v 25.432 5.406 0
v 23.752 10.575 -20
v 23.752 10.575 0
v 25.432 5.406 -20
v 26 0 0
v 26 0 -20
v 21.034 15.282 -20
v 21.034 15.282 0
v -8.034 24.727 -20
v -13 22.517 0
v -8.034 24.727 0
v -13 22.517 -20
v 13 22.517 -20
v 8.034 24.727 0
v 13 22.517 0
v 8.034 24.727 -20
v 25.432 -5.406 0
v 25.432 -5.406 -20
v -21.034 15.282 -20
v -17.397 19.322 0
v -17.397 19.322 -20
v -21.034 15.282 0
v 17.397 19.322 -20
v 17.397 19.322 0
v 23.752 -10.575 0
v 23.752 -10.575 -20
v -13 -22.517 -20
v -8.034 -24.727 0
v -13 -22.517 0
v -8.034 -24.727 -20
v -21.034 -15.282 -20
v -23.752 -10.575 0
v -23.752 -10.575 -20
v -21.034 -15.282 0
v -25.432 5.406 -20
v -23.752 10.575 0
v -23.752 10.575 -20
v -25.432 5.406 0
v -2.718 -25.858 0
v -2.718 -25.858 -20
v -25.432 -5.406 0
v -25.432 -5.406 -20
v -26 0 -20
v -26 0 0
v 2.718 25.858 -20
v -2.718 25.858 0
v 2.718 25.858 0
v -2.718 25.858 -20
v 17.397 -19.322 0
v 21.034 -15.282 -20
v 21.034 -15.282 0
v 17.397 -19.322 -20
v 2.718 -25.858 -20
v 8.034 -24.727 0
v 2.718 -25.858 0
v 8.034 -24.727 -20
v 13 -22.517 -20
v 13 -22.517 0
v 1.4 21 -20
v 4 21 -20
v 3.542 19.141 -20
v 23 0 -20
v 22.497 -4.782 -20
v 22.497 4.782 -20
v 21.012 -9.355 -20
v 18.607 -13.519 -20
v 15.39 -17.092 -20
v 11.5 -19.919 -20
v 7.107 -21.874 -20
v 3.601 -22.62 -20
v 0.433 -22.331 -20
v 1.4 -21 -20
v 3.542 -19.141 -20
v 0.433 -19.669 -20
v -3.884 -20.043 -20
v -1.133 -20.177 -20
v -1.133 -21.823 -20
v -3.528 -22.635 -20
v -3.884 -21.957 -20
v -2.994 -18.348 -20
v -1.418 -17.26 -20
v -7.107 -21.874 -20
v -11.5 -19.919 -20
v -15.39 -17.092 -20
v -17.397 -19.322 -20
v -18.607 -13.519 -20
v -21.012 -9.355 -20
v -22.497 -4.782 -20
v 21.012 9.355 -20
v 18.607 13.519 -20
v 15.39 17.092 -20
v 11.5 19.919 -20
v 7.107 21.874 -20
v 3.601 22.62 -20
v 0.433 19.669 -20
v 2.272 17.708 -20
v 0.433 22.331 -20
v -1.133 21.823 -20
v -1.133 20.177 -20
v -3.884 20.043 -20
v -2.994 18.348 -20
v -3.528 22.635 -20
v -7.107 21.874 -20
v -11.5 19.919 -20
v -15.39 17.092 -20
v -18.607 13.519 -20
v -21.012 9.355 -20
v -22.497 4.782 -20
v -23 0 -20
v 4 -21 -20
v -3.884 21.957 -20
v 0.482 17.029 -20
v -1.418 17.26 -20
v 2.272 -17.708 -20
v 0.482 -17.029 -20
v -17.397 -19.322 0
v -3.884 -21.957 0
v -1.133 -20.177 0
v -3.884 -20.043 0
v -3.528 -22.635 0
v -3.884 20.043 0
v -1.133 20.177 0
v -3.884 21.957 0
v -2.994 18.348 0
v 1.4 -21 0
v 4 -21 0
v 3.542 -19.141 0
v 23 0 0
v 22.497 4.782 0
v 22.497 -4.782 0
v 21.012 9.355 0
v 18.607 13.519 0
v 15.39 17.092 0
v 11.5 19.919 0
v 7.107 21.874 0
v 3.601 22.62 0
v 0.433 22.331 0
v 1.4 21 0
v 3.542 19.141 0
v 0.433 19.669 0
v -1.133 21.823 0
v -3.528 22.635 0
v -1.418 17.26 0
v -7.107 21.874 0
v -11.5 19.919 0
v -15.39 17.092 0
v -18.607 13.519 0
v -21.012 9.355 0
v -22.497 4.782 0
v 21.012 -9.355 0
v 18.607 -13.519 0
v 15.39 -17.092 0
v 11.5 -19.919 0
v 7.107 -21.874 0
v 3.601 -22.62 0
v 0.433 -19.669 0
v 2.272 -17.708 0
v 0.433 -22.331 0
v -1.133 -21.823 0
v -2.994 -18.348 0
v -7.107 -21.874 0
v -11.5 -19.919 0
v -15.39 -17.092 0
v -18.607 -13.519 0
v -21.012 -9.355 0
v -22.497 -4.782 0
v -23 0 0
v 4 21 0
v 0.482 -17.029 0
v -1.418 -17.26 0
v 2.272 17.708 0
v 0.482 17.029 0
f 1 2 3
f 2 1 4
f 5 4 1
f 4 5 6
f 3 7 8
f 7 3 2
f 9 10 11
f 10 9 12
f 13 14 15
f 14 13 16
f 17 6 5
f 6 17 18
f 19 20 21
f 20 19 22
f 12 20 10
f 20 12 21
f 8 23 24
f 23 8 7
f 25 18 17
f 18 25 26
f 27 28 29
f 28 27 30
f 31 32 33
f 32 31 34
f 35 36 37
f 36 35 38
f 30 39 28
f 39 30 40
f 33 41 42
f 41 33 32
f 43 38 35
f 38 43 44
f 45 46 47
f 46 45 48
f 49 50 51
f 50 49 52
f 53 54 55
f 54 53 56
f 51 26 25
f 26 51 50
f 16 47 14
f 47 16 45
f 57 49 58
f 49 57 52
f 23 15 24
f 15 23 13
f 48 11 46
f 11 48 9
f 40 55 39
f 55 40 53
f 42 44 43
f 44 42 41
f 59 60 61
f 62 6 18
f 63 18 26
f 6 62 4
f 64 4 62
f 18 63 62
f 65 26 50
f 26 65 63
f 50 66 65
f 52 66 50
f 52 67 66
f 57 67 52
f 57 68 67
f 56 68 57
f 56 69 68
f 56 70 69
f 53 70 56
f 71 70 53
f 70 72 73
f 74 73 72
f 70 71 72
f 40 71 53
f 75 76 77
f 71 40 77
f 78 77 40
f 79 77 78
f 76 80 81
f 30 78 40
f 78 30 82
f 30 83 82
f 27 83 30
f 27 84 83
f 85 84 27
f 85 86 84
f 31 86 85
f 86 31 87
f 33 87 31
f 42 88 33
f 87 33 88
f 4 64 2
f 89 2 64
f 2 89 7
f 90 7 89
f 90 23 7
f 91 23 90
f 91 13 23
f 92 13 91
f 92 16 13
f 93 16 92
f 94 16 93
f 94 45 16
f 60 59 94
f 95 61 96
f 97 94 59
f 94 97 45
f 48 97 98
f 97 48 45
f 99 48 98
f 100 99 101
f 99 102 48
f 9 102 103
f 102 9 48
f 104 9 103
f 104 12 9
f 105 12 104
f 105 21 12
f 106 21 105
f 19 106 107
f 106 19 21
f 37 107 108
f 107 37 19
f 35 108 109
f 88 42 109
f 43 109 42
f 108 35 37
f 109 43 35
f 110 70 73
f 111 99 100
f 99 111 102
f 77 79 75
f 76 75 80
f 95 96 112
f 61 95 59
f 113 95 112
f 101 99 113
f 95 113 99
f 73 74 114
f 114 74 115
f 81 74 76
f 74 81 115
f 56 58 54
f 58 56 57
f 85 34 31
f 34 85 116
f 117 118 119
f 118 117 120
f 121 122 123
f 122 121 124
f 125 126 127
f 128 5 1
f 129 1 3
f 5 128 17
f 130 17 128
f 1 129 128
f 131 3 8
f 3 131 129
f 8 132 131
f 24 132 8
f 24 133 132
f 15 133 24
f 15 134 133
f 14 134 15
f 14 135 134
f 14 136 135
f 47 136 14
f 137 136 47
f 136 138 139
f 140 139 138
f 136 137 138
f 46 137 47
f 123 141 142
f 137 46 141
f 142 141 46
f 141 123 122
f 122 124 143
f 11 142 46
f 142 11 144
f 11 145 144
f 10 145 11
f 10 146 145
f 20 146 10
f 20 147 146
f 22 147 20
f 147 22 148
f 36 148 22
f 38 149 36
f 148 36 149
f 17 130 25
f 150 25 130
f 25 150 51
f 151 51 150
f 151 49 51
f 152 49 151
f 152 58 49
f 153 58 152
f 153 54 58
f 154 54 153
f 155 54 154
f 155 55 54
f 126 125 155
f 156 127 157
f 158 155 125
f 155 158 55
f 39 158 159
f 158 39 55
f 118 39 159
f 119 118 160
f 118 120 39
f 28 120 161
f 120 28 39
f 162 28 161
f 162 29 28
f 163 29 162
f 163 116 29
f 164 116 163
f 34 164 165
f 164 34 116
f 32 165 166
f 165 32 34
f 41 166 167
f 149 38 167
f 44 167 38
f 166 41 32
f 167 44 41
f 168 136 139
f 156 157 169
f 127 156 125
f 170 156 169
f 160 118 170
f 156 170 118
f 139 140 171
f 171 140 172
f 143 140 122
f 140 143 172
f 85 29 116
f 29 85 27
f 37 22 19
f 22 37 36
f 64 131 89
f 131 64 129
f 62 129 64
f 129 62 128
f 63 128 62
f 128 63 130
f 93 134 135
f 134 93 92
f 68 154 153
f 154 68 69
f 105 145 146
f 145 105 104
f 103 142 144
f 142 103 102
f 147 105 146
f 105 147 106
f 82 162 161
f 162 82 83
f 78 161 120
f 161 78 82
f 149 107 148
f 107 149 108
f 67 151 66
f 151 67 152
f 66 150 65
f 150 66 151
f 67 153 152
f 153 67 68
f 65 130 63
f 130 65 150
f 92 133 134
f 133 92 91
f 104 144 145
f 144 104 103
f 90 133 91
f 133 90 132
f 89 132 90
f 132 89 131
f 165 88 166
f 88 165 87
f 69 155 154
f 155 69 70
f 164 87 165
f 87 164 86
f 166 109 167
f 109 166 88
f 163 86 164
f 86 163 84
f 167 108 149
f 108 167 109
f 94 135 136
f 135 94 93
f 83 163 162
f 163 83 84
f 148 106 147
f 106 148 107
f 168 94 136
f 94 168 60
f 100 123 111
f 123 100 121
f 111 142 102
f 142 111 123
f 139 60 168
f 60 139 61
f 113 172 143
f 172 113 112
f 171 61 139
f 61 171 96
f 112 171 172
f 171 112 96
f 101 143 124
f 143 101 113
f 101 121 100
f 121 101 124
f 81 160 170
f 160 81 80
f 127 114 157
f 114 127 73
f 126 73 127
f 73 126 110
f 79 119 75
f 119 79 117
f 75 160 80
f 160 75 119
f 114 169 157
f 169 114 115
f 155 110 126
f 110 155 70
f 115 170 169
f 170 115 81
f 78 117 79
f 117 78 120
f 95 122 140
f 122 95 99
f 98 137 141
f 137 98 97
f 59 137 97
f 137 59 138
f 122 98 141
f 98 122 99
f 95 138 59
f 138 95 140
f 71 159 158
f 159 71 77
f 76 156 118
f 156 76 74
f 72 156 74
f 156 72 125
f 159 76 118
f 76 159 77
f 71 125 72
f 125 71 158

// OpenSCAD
podRadius = 52/2;
podDepth = 20;
podHoleRadius = 23;
bezelRadius = podRadius + 5;
bezelHeight = 10;

// Adafruit 1.8" display with EYESPI
boardWidth = 57;
boardDepth = 36;
boardThickness = 6.5;
holeX = 25;
holeY = 15;
cornerRadius = 6;

boltPosition = 21;

/*
// zio.cc 1.5"
screenWidth = 30;
screenDepth = 34;
screenThickness = 1.5;

boardWidth = 45;
boardDepth = 36;
boardThickness = 1;
*/

module top()
{
    difference() {
        hull() {
            translate([0, 0, bezelHeight / 2])
                cylinder(h = bezelHeight, r = bezelRadius, center = true);
            
            translate([holeX, holeY, bezelHeight / 2])
                cylinder(h = bezelHeight, r = cornerRadius, center = true);
            translate([-holeX, holeY, bezelHeight / 2])
                cylinder(h = bezelHeight, r = cornerRadius, center = true);
            translate([holeX, -holeY, bezelHeight / 2])
                cylinder(h = bezelHeight, r = cornerRadius, center = true);
            translate([-holeX, -holeY, bezelHeight / 2])
                cylinder(h = bezelHeight, r = cornerRadius, center = true);
        }
        
        translate([holeX, holeY, 0])
            cylinder(h = bezelHeight, r = 1, center = true);
        translate([-holeX, holeY, 0])
            cylinder(h = bezelHeight, r = 1, center = true);
        translate([holeX, -holeY, 0])
            cylinder(h = bezelHeight, r = 1, center = true);
        translate([-holeX, -holeY, 0])
            cylinder(h = bezelHeight, r = 1, center = true);
        
        // cutout
        translate([0, 0, 2.9])
            cube([boardWidth, 25, 6], center = true);

        translate([0, boltPosition, 0])
            cylinder(h = 100, r = 1.7, center = true);
        translate([0, -boltPosition, 0])
            cylinder(h = 100, r = 1.7, center = true);

    }    
}

module display()
{
    translate([0, 0, boardThickness / 2])
        cube([boardWidth, boardDepth, boardThickness], center = true);
}

module base()
{
    difference() {
        union () {
            translate([0, boltPosition, -podDepth / 2])
                cylinder(h = podDepth, r = 4, center = true);
            translate([0, -boltPosition, -podDepth / 2])
                cylinder(h = podDepth, r = 4, center = true);
            difference(){
                union () {
                    translate([0, 0, -podDepth / 2])
                        cylinder(h = podDepth, r = podRadius, center = true);
                }
                cylinder (h = 100, r = podHoleRadius, center = true);
            }
        }
        translate([0, boltPosition, 0])
            cylinder(h = 100, r = 1.4, center = true);
        translate([0, -boltPosition, 0])
            cylinder(h = 100, r = 1.4, center = true);
    }
}

difference() {
    union () {
        //top();
        base();
    }
    translate([0, 0, 4])
        display();
}
